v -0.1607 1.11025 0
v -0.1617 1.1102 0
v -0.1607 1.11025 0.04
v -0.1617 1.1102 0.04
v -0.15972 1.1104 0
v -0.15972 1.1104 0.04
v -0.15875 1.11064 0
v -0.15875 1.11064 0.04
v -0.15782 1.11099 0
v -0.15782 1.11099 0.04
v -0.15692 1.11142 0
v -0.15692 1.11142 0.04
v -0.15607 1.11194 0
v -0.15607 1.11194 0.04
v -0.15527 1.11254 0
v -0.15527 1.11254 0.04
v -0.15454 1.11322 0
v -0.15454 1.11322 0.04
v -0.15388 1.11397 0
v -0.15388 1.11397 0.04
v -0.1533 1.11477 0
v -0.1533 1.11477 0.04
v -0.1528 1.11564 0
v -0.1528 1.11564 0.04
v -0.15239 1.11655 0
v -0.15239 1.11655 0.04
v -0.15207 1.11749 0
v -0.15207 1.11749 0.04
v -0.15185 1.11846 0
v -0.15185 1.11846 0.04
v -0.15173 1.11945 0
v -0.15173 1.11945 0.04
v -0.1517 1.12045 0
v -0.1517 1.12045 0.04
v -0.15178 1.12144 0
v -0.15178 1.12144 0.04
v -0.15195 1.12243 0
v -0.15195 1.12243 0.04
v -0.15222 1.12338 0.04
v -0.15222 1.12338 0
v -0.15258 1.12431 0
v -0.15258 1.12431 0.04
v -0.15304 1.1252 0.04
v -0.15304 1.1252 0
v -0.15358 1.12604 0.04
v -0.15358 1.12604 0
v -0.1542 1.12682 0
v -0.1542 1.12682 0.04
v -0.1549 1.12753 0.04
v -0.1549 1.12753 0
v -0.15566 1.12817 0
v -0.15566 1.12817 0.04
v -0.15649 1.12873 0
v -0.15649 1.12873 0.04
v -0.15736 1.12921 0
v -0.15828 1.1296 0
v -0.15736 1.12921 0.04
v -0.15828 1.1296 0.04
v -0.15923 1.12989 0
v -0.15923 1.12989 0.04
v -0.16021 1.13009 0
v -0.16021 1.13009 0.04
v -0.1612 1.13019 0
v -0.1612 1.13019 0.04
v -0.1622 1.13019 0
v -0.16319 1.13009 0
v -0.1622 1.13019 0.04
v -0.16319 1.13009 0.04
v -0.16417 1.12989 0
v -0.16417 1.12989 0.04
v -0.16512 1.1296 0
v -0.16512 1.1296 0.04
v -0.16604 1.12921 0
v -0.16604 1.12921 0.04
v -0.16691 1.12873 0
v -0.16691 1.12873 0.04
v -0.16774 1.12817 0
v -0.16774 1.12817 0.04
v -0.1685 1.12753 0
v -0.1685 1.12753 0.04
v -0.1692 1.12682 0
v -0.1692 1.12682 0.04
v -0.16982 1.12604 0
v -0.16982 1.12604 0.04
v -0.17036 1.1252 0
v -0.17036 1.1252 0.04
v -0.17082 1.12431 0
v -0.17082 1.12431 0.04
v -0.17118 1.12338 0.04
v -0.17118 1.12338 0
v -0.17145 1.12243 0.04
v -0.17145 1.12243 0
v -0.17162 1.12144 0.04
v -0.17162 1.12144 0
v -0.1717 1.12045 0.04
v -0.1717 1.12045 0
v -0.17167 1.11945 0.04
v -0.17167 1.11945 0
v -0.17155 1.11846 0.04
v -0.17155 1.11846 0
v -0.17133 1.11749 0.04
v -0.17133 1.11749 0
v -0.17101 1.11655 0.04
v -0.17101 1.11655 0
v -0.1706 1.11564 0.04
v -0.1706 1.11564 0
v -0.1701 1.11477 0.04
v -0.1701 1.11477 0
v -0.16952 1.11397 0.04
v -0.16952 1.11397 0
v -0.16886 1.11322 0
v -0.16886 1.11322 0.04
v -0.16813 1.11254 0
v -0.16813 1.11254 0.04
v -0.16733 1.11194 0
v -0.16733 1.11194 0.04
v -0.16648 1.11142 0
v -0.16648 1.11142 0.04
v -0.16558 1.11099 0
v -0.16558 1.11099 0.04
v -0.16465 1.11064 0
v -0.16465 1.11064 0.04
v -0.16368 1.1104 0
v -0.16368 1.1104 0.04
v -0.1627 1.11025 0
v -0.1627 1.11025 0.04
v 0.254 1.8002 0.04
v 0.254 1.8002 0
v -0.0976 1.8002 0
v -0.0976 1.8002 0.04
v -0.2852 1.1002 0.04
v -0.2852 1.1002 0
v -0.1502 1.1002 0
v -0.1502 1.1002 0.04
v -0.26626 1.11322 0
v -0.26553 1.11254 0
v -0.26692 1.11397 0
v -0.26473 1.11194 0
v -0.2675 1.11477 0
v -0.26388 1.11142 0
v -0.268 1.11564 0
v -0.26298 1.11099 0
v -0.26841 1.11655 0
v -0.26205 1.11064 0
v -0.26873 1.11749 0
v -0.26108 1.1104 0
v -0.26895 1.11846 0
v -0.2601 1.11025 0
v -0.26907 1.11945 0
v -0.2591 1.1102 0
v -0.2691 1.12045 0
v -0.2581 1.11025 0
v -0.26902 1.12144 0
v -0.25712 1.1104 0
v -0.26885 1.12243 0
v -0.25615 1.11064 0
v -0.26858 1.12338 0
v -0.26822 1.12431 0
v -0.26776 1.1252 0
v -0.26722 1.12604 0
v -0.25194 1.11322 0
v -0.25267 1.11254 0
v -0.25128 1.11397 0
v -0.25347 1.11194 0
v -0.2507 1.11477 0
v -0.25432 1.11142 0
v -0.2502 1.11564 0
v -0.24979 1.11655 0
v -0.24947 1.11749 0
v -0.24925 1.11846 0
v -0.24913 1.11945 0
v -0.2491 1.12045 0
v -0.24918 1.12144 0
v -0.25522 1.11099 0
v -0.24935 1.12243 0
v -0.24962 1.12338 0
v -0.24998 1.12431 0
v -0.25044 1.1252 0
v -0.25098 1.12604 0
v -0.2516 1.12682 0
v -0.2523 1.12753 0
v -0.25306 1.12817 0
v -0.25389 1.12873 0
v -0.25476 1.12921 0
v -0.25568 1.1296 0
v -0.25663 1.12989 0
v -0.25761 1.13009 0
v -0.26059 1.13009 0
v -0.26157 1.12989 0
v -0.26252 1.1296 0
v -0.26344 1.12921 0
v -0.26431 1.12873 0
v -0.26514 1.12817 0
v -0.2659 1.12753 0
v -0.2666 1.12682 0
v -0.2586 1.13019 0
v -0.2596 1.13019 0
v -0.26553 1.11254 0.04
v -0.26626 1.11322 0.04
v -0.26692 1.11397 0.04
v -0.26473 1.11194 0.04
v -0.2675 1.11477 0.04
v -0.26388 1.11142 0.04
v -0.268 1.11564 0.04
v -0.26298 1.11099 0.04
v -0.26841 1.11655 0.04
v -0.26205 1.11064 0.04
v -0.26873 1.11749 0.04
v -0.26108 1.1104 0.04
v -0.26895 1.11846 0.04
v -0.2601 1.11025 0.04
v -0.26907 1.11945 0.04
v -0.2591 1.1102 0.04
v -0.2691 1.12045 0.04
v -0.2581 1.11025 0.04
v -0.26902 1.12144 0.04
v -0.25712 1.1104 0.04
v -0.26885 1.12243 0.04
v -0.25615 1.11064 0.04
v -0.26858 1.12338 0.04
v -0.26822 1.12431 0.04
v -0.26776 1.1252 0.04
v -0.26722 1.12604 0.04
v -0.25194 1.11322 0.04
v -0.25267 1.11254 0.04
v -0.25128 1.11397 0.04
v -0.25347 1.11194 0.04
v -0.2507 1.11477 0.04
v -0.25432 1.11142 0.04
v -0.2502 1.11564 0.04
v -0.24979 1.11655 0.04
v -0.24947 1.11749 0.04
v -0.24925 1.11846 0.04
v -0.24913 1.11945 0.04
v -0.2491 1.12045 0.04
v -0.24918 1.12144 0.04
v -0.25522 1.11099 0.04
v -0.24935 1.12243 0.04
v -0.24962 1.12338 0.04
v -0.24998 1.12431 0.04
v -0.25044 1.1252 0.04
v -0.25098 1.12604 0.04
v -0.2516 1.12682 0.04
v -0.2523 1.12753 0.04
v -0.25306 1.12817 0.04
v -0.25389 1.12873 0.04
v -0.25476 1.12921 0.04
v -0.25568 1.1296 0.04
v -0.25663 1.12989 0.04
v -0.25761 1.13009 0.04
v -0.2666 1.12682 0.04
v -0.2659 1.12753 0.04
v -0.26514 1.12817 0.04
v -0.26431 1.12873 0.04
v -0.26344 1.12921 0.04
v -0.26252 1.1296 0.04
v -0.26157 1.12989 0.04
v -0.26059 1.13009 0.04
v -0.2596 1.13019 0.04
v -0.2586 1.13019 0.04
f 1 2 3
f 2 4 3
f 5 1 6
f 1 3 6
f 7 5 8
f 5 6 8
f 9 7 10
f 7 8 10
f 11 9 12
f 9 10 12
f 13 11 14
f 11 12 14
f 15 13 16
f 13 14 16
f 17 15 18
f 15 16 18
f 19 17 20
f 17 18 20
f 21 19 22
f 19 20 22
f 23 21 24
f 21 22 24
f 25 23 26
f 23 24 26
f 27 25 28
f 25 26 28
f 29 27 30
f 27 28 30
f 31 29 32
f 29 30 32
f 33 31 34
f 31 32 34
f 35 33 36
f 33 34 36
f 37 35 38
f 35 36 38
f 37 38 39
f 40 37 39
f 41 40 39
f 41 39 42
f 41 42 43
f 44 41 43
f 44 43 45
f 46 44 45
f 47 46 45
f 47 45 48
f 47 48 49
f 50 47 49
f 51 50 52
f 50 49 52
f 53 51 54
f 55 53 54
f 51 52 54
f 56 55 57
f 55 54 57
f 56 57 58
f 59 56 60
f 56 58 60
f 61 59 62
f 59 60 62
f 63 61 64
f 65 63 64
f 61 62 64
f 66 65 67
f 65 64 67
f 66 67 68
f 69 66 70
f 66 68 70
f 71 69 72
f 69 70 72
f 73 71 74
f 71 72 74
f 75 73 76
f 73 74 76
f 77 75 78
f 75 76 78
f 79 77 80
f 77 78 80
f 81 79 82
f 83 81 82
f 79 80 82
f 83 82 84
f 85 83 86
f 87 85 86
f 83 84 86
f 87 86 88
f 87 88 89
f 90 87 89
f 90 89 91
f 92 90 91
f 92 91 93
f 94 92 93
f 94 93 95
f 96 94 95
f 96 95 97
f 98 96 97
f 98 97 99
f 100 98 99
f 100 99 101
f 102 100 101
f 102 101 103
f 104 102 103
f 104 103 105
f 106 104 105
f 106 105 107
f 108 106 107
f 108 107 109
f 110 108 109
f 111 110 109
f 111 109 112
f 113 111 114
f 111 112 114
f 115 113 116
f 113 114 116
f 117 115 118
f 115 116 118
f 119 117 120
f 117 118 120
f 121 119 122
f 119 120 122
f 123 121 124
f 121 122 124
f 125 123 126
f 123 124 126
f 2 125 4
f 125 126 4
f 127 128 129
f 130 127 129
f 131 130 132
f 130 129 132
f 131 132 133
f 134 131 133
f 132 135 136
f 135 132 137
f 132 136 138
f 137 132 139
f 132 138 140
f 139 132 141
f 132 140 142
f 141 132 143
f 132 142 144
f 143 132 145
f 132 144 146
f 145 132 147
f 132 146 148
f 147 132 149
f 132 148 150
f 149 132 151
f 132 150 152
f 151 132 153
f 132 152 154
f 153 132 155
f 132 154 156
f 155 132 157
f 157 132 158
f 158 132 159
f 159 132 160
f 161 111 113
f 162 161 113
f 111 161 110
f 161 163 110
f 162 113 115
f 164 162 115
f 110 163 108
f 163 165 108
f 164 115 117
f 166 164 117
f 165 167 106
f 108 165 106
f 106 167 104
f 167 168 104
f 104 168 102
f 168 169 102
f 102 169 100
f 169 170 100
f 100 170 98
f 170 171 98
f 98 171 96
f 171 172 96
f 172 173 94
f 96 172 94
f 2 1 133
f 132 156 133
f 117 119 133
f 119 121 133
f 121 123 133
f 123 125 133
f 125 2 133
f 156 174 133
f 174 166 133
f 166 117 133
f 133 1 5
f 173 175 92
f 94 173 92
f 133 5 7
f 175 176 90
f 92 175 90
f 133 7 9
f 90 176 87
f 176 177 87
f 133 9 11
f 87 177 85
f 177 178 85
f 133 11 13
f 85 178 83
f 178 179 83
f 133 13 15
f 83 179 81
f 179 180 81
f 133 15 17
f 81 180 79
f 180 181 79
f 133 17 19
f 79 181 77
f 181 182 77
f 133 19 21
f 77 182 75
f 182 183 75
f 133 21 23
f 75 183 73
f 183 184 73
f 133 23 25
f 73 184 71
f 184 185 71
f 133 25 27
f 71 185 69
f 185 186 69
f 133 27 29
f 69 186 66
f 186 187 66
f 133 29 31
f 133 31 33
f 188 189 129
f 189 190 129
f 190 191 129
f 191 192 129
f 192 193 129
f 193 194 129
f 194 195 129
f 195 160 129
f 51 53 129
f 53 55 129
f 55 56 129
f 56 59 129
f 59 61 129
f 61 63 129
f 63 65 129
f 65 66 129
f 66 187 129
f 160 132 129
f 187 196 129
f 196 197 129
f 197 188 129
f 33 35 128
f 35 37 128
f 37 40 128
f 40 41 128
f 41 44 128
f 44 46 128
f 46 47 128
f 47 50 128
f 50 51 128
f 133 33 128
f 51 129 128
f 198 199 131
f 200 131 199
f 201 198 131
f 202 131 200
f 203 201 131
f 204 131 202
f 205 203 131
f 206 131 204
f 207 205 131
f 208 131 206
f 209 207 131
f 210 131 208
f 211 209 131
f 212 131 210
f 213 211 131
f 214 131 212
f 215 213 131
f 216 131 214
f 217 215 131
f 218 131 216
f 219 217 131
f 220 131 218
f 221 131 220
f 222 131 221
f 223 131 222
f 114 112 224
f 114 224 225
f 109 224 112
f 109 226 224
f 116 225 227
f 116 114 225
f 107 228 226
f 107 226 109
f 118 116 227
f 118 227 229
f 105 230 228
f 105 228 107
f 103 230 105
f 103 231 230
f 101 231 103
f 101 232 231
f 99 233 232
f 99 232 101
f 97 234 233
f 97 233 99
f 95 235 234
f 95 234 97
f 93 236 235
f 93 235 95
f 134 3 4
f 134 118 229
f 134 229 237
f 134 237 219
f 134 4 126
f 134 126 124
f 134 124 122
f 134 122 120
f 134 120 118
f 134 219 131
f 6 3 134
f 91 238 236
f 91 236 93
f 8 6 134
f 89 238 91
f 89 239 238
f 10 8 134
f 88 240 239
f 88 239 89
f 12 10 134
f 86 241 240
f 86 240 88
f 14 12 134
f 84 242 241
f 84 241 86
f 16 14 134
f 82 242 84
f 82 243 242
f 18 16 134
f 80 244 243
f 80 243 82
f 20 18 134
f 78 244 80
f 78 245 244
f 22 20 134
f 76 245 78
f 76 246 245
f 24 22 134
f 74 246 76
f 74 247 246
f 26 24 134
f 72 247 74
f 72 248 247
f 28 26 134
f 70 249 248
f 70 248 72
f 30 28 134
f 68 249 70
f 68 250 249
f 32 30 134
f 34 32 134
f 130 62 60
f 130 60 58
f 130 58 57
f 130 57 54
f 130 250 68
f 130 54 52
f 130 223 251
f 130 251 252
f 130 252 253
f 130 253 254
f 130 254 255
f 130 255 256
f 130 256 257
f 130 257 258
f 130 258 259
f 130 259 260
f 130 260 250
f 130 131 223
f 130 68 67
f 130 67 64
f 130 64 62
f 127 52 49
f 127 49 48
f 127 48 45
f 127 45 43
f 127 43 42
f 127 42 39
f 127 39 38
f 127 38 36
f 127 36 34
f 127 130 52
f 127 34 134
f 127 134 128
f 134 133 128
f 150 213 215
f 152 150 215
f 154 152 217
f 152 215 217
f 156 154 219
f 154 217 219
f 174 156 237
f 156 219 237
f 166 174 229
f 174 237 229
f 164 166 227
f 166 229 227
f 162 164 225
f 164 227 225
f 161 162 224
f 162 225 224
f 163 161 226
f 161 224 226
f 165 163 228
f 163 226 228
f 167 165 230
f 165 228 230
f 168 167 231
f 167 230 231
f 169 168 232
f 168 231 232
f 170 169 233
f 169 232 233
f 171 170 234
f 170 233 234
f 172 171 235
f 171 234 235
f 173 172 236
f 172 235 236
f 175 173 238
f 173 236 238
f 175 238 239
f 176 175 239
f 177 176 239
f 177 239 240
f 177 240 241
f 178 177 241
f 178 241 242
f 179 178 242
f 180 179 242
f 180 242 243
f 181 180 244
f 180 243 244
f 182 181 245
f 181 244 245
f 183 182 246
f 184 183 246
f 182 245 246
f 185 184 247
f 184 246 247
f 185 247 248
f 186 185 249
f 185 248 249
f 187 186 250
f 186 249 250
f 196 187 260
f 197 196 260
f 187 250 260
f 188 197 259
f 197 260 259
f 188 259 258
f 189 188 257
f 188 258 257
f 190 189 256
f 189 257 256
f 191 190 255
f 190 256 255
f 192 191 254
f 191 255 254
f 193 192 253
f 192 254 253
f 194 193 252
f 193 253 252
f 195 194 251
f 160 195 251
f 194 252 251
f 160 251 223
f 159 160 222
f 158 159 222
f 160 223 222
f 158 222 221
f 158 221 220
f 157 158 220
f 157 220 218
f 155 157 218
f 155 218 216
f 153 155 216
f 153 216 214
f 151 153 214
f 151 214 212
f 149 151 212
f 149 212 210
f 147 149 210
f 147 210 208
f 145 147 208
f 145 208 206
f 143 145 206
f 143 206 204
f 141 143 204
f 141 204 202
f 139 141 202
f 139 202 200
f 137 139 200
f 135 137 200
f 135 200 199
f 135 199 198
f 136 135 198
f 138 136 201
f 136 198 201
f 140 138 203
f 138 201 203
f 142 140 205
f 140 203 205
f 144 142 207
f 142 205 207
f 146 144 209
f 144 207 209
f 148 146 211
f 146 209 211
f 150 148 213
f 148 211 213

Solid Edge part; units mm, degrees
sketch "Sketch1" plane through (0, 0, 0) normal (0, 0, 1) x (1, 0, 0)
  line L0 (-0.1502, 1.1002) -> (0.254, 1.8002)
  line L1 (0.254, 1.8002) -> (-0.0976, 1.8002)
  line L2 (-0.0976, 1.8002) -> (-0.2852, 1.1002)
  line L3 (-0.2852, 1.1002) -> (-0.1502, 1.1002)
extrude "Protrusion1" add sketch "Sketch1" along normal blind 0.04
hole "Bohrung_7" at (-0.1617, 1.1202, 0.04) direction (0, 0, -1) diameter 0.02 end through all
hole "Hole1" at (-0.2591, 1.1202, 0.04) direction (0, 0, -1) diameter 0.02 end through all
